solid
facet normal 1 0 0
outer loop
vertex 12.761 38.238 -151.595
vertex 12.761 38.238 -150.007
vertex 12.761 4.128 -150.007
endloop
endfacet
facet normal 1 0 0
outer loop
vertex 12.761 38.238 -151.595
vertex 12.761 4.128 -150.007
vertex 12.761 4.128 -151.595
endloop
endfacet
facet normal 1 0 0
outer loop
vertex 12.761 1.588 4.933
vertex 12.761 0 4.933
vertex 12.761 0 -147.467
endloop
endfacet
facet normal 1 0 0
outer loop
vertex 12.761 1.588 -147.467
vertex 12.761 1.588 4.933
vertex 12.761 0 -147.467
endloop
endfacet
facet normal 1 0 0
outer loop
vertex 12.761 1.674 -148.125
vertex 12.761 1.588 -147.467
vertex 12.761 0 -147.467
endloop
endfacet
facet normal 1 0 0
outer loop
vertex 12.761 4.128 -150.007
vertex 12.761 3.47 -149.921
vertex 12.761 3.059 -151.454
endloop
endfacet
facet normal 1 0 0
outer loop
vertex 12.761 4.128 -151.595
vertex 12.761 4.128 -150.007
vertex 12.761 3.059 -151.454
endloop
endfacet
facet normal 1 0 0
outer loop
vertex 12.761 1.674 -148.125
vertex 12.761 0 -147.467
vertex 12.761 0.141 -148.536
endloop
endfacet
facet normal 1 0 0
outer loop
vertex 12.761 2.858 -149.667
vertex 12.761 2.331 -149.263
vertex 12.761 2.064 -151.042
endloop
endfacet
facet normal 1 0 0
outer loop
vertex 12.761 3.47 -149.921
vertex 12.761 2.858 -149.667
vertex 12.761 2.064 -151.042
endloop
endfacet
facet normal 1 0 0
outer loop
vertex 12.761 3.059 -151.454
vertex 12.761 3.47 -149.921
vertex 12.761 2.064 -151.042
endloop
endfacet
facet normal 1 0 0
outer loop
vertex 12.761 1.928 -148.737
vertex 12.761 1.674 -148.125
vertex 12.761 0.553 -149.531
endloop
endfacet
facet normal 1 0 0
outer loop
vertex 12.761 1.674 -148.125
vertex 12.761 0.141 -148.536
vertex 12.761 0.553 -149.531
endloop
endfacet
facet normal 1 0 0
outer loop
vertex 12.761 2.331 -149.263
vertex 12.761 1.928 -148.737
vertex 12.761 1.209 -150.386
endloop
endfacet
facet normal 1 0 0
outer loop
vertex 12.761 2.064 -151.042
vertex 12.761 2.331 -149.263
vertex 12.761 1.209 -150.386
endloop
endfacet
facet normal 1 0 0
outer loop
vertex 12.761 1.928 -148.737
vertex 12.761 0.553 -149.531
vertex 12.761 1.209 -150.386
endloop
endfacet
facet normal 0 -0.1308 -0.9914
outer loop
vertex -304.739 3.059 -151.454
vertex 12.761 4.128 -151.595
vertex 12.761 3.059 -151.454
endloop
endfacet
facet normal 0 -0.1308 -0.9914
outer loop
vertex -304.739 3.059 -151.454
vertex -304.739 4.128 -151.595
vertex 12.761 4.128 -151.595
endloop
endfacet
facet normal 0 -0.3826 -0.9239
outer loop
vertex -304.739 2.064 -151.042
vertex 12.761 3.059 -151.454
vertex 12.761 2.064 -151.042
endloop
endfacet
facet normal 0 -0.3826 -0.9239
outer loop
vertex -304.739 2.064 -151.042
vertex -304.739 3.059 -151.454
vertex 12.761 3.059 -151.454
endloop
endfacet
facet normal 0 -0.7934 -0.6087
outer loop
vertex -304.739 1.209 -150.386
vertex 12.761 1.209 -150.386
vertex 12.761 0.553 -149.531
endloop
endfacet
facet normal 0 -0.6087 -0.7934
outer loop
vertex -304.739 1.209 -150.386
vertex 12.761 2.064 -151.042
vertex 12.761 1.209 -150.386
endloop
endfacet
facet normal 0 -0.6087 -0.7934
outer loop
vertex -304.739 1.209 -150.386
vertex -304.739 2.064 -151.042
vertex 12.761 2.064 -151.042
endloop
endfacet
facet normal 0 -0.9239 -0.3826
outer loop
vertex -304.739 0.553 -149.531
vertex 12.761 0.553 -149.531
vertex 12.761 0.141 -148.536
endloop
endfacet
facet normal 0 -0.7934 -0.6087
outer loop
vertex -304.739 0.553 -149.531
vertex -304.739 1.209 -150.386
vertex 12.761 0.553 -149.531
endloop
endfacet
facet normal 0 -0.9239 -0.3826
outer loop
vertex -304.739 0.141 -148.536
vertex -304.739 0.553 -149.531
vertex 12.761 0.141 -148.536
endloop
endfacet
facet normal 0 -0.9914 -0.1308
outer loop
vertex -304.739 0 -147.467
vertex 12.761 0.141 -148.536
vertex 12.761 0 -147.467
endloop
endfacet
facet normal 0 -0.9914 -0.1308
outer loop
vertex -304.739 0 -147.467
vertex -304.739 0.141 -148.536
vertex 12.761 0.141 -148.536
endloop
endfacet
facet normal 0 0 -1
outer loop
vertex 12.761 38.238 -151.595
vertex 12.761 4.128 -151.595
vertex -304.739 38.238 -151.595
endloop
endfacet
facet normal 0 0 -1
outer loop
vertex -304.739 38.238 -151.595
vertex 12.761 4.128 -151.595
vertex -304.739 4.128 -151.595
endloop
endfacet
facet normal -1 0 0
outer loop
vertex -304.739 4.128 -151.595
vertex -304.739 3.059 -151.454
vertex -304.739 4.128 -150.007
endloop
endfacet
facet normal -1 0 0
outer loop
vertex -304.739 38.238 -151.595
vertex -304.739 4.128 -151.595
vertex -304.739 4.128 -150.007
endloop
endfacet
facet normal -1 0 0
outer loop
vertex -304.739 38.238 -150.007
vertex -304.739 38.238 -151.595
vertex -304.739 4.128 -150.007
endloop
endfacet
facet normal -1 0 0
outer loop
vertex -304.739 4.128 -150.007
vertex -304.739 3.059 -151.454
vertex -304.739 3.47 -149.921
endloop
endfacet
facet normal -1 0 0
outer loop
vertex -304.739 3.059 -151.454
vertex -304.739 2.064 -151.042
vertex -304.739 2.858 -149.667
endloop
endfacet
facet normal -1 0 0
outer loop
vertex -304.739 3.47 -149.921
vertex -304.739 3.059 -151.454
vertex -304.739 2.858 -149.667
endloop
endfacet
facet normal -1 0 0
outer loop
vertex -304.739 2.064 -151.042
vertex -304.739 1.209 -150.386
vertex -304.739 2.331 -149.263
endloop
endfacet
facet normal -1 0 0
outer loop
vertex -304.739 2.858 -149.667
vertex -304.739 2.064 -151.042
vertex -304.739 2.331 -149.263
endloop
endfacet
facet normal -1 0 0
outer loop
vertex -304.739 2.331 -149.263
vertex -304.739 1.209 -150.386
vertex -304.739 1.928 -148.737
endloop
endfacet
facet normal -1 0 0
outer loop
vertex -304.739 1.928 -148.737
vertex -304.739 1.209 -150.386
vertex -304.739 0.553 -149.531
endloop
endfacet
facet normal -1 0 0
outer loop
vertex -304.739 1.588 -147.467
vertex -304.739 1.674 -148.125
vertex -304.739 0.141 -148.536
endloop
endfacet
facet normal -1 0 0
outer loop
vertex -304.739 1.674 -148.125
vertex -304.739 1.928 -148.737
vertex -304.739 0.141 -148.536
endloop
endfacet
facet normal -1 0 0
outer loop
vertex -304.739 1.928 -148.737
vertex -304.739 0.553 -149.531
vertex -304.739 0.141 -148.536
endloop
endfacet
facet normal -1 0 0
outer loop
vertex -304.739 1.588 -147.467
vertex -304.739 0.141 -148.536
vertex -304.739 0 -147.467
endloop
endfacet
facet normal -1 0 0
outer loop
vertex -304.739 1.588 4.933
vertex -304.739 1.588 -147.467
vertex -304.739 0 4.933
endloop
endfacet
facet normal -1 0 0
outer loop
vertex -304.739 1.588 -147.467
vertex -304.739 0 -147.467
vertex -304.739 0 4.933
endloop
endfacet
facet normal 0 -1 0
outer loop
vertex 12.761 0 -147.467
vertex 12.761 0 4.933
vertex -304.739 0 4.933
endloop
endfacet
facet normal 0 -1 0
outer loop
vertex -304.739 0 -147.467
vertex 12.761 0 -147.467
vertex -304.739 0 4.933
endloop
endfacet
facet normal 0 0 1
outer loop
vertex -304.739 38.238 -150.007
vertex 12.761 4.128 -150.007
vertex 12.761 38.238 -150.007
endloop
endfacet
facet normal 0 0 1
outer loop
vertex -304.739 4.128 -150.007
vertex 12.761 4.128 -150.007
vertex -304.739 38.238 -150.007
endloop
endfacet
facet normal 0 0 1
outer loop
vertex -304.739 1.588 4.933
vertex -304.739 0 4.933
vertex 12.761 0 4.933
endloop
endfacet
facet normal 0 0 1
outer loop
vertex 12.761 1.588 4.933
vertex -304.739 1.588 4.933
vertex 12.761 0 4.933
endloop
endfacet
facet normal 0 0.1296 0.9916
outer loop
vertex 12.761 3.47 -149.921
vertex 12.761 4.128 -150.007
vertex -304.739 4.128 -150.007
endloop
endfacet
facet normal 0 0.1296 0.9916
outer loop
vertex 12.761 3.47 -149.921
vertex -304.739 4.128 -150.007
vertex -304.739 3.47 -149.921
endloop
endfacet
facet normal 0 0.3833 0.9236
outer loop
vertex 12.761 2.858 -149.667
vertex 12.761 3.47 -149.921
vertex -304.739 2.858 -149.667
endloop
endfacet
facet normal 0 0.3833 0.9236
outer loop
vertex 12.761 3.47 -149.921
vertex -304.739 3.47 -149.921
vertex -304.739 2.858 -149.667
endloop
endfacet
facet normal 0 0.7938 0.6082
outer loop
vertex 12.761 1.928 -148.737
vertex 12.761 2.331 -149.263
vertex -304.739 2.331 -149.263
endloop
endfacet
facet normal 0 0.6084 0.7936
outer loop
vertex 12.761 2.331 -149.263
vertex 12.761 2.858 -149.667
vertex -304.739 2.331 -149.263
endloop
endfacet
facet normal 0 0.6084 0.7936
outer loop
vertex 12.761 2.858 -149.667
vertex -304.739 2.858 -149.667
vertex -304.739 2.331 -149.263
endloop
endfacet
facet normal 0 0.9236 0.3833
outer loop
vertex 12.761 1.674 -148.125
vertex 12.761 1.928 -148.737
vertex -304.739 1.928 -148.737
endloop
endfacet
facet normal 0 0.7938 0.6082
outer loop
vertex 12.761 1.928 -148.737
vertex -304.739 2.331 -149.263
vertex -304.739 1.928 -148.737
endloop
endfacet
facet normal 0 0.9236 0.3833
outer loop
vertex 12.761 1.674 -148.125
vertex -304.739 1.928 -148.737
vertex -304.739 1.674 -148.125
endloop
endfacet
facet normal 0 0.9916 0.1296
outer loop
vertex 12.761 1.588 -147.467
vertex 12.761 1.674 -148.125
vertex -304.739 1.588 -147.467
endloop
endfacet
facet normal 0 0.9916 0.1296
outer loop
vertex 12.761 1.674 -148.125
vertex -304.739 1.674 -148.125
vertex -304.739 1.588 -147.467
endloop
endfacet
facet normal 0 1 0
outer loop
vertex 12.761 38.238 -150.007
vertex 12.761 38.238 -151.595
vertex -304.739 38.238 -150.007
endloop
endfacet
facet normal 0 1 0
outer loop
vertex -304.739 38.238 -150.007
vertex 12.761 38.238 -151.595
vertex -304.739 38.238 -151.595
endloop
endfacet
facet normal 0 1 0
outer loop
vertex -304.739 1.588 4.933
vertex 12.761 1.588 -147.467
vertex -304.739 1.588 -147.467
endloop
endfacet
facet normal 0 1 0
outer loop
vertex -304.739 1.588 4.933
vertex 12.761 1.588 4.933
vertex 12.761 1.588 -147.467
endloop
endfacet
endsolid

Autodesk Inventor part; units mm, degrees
ref_plane "YZ Plane" through (0, 0, 0) normal (1, 0, 0) x (0, 1, 0)
ref_plane "XZ Plane" through (0, 0, 0) normal (0, 1, 0) x (-1, 0, 0)
ref_plane "XY Plane" through (0, 0, 0) normal (0, 0, 1) x (1, 0, 0)
sketch "Sketch1" plane through (0, 0, 0) normal (0, 1, 0) x (-1, 0, 0)
  line L0 (-12.7612, -185.5673) -> (304.7388, -185.5673)
  line L1 (304.7388, -185.5673) -> (304.7388, 4.9327)
  line L2 (304.7388, 4.9327) -> (-12.7612, 4.9327)
  line L3 (-12.7612, 4.9327) -> (-12.7612, -185.5673)
  point P0 (0, 0)
  dimension "d0" = 317.5
  dimension "d1" = 190.5
extrude "Extrusion1" add sketch "Sketch1" along normal blind 1.5875
sketch "Sketch2" plane through (0, 1.5875, 0) normal (0, 1, 0) x (1, 0, 0)
  line L0 (12.7612, 185.5673) -> (-304.7388, 185.5673) projected
  line L1 (12.7612, -4.9327) -> (12.7612, 185.5673) projected
  line L2 (-341.3221, 147.4673) -> (43.4131, 147.4673)
  point P0 (0, 0)
  dimension "d4" = 38.1
bend part "Bend Part1" radius 2.54 angle 90 line through (-341.3221, 1.5875, -147.4673) along (1, 0, 0) centre toward (0, 1, 0) moving side (0, 0, -1) both sides no
properties part number "battery holder poly"
